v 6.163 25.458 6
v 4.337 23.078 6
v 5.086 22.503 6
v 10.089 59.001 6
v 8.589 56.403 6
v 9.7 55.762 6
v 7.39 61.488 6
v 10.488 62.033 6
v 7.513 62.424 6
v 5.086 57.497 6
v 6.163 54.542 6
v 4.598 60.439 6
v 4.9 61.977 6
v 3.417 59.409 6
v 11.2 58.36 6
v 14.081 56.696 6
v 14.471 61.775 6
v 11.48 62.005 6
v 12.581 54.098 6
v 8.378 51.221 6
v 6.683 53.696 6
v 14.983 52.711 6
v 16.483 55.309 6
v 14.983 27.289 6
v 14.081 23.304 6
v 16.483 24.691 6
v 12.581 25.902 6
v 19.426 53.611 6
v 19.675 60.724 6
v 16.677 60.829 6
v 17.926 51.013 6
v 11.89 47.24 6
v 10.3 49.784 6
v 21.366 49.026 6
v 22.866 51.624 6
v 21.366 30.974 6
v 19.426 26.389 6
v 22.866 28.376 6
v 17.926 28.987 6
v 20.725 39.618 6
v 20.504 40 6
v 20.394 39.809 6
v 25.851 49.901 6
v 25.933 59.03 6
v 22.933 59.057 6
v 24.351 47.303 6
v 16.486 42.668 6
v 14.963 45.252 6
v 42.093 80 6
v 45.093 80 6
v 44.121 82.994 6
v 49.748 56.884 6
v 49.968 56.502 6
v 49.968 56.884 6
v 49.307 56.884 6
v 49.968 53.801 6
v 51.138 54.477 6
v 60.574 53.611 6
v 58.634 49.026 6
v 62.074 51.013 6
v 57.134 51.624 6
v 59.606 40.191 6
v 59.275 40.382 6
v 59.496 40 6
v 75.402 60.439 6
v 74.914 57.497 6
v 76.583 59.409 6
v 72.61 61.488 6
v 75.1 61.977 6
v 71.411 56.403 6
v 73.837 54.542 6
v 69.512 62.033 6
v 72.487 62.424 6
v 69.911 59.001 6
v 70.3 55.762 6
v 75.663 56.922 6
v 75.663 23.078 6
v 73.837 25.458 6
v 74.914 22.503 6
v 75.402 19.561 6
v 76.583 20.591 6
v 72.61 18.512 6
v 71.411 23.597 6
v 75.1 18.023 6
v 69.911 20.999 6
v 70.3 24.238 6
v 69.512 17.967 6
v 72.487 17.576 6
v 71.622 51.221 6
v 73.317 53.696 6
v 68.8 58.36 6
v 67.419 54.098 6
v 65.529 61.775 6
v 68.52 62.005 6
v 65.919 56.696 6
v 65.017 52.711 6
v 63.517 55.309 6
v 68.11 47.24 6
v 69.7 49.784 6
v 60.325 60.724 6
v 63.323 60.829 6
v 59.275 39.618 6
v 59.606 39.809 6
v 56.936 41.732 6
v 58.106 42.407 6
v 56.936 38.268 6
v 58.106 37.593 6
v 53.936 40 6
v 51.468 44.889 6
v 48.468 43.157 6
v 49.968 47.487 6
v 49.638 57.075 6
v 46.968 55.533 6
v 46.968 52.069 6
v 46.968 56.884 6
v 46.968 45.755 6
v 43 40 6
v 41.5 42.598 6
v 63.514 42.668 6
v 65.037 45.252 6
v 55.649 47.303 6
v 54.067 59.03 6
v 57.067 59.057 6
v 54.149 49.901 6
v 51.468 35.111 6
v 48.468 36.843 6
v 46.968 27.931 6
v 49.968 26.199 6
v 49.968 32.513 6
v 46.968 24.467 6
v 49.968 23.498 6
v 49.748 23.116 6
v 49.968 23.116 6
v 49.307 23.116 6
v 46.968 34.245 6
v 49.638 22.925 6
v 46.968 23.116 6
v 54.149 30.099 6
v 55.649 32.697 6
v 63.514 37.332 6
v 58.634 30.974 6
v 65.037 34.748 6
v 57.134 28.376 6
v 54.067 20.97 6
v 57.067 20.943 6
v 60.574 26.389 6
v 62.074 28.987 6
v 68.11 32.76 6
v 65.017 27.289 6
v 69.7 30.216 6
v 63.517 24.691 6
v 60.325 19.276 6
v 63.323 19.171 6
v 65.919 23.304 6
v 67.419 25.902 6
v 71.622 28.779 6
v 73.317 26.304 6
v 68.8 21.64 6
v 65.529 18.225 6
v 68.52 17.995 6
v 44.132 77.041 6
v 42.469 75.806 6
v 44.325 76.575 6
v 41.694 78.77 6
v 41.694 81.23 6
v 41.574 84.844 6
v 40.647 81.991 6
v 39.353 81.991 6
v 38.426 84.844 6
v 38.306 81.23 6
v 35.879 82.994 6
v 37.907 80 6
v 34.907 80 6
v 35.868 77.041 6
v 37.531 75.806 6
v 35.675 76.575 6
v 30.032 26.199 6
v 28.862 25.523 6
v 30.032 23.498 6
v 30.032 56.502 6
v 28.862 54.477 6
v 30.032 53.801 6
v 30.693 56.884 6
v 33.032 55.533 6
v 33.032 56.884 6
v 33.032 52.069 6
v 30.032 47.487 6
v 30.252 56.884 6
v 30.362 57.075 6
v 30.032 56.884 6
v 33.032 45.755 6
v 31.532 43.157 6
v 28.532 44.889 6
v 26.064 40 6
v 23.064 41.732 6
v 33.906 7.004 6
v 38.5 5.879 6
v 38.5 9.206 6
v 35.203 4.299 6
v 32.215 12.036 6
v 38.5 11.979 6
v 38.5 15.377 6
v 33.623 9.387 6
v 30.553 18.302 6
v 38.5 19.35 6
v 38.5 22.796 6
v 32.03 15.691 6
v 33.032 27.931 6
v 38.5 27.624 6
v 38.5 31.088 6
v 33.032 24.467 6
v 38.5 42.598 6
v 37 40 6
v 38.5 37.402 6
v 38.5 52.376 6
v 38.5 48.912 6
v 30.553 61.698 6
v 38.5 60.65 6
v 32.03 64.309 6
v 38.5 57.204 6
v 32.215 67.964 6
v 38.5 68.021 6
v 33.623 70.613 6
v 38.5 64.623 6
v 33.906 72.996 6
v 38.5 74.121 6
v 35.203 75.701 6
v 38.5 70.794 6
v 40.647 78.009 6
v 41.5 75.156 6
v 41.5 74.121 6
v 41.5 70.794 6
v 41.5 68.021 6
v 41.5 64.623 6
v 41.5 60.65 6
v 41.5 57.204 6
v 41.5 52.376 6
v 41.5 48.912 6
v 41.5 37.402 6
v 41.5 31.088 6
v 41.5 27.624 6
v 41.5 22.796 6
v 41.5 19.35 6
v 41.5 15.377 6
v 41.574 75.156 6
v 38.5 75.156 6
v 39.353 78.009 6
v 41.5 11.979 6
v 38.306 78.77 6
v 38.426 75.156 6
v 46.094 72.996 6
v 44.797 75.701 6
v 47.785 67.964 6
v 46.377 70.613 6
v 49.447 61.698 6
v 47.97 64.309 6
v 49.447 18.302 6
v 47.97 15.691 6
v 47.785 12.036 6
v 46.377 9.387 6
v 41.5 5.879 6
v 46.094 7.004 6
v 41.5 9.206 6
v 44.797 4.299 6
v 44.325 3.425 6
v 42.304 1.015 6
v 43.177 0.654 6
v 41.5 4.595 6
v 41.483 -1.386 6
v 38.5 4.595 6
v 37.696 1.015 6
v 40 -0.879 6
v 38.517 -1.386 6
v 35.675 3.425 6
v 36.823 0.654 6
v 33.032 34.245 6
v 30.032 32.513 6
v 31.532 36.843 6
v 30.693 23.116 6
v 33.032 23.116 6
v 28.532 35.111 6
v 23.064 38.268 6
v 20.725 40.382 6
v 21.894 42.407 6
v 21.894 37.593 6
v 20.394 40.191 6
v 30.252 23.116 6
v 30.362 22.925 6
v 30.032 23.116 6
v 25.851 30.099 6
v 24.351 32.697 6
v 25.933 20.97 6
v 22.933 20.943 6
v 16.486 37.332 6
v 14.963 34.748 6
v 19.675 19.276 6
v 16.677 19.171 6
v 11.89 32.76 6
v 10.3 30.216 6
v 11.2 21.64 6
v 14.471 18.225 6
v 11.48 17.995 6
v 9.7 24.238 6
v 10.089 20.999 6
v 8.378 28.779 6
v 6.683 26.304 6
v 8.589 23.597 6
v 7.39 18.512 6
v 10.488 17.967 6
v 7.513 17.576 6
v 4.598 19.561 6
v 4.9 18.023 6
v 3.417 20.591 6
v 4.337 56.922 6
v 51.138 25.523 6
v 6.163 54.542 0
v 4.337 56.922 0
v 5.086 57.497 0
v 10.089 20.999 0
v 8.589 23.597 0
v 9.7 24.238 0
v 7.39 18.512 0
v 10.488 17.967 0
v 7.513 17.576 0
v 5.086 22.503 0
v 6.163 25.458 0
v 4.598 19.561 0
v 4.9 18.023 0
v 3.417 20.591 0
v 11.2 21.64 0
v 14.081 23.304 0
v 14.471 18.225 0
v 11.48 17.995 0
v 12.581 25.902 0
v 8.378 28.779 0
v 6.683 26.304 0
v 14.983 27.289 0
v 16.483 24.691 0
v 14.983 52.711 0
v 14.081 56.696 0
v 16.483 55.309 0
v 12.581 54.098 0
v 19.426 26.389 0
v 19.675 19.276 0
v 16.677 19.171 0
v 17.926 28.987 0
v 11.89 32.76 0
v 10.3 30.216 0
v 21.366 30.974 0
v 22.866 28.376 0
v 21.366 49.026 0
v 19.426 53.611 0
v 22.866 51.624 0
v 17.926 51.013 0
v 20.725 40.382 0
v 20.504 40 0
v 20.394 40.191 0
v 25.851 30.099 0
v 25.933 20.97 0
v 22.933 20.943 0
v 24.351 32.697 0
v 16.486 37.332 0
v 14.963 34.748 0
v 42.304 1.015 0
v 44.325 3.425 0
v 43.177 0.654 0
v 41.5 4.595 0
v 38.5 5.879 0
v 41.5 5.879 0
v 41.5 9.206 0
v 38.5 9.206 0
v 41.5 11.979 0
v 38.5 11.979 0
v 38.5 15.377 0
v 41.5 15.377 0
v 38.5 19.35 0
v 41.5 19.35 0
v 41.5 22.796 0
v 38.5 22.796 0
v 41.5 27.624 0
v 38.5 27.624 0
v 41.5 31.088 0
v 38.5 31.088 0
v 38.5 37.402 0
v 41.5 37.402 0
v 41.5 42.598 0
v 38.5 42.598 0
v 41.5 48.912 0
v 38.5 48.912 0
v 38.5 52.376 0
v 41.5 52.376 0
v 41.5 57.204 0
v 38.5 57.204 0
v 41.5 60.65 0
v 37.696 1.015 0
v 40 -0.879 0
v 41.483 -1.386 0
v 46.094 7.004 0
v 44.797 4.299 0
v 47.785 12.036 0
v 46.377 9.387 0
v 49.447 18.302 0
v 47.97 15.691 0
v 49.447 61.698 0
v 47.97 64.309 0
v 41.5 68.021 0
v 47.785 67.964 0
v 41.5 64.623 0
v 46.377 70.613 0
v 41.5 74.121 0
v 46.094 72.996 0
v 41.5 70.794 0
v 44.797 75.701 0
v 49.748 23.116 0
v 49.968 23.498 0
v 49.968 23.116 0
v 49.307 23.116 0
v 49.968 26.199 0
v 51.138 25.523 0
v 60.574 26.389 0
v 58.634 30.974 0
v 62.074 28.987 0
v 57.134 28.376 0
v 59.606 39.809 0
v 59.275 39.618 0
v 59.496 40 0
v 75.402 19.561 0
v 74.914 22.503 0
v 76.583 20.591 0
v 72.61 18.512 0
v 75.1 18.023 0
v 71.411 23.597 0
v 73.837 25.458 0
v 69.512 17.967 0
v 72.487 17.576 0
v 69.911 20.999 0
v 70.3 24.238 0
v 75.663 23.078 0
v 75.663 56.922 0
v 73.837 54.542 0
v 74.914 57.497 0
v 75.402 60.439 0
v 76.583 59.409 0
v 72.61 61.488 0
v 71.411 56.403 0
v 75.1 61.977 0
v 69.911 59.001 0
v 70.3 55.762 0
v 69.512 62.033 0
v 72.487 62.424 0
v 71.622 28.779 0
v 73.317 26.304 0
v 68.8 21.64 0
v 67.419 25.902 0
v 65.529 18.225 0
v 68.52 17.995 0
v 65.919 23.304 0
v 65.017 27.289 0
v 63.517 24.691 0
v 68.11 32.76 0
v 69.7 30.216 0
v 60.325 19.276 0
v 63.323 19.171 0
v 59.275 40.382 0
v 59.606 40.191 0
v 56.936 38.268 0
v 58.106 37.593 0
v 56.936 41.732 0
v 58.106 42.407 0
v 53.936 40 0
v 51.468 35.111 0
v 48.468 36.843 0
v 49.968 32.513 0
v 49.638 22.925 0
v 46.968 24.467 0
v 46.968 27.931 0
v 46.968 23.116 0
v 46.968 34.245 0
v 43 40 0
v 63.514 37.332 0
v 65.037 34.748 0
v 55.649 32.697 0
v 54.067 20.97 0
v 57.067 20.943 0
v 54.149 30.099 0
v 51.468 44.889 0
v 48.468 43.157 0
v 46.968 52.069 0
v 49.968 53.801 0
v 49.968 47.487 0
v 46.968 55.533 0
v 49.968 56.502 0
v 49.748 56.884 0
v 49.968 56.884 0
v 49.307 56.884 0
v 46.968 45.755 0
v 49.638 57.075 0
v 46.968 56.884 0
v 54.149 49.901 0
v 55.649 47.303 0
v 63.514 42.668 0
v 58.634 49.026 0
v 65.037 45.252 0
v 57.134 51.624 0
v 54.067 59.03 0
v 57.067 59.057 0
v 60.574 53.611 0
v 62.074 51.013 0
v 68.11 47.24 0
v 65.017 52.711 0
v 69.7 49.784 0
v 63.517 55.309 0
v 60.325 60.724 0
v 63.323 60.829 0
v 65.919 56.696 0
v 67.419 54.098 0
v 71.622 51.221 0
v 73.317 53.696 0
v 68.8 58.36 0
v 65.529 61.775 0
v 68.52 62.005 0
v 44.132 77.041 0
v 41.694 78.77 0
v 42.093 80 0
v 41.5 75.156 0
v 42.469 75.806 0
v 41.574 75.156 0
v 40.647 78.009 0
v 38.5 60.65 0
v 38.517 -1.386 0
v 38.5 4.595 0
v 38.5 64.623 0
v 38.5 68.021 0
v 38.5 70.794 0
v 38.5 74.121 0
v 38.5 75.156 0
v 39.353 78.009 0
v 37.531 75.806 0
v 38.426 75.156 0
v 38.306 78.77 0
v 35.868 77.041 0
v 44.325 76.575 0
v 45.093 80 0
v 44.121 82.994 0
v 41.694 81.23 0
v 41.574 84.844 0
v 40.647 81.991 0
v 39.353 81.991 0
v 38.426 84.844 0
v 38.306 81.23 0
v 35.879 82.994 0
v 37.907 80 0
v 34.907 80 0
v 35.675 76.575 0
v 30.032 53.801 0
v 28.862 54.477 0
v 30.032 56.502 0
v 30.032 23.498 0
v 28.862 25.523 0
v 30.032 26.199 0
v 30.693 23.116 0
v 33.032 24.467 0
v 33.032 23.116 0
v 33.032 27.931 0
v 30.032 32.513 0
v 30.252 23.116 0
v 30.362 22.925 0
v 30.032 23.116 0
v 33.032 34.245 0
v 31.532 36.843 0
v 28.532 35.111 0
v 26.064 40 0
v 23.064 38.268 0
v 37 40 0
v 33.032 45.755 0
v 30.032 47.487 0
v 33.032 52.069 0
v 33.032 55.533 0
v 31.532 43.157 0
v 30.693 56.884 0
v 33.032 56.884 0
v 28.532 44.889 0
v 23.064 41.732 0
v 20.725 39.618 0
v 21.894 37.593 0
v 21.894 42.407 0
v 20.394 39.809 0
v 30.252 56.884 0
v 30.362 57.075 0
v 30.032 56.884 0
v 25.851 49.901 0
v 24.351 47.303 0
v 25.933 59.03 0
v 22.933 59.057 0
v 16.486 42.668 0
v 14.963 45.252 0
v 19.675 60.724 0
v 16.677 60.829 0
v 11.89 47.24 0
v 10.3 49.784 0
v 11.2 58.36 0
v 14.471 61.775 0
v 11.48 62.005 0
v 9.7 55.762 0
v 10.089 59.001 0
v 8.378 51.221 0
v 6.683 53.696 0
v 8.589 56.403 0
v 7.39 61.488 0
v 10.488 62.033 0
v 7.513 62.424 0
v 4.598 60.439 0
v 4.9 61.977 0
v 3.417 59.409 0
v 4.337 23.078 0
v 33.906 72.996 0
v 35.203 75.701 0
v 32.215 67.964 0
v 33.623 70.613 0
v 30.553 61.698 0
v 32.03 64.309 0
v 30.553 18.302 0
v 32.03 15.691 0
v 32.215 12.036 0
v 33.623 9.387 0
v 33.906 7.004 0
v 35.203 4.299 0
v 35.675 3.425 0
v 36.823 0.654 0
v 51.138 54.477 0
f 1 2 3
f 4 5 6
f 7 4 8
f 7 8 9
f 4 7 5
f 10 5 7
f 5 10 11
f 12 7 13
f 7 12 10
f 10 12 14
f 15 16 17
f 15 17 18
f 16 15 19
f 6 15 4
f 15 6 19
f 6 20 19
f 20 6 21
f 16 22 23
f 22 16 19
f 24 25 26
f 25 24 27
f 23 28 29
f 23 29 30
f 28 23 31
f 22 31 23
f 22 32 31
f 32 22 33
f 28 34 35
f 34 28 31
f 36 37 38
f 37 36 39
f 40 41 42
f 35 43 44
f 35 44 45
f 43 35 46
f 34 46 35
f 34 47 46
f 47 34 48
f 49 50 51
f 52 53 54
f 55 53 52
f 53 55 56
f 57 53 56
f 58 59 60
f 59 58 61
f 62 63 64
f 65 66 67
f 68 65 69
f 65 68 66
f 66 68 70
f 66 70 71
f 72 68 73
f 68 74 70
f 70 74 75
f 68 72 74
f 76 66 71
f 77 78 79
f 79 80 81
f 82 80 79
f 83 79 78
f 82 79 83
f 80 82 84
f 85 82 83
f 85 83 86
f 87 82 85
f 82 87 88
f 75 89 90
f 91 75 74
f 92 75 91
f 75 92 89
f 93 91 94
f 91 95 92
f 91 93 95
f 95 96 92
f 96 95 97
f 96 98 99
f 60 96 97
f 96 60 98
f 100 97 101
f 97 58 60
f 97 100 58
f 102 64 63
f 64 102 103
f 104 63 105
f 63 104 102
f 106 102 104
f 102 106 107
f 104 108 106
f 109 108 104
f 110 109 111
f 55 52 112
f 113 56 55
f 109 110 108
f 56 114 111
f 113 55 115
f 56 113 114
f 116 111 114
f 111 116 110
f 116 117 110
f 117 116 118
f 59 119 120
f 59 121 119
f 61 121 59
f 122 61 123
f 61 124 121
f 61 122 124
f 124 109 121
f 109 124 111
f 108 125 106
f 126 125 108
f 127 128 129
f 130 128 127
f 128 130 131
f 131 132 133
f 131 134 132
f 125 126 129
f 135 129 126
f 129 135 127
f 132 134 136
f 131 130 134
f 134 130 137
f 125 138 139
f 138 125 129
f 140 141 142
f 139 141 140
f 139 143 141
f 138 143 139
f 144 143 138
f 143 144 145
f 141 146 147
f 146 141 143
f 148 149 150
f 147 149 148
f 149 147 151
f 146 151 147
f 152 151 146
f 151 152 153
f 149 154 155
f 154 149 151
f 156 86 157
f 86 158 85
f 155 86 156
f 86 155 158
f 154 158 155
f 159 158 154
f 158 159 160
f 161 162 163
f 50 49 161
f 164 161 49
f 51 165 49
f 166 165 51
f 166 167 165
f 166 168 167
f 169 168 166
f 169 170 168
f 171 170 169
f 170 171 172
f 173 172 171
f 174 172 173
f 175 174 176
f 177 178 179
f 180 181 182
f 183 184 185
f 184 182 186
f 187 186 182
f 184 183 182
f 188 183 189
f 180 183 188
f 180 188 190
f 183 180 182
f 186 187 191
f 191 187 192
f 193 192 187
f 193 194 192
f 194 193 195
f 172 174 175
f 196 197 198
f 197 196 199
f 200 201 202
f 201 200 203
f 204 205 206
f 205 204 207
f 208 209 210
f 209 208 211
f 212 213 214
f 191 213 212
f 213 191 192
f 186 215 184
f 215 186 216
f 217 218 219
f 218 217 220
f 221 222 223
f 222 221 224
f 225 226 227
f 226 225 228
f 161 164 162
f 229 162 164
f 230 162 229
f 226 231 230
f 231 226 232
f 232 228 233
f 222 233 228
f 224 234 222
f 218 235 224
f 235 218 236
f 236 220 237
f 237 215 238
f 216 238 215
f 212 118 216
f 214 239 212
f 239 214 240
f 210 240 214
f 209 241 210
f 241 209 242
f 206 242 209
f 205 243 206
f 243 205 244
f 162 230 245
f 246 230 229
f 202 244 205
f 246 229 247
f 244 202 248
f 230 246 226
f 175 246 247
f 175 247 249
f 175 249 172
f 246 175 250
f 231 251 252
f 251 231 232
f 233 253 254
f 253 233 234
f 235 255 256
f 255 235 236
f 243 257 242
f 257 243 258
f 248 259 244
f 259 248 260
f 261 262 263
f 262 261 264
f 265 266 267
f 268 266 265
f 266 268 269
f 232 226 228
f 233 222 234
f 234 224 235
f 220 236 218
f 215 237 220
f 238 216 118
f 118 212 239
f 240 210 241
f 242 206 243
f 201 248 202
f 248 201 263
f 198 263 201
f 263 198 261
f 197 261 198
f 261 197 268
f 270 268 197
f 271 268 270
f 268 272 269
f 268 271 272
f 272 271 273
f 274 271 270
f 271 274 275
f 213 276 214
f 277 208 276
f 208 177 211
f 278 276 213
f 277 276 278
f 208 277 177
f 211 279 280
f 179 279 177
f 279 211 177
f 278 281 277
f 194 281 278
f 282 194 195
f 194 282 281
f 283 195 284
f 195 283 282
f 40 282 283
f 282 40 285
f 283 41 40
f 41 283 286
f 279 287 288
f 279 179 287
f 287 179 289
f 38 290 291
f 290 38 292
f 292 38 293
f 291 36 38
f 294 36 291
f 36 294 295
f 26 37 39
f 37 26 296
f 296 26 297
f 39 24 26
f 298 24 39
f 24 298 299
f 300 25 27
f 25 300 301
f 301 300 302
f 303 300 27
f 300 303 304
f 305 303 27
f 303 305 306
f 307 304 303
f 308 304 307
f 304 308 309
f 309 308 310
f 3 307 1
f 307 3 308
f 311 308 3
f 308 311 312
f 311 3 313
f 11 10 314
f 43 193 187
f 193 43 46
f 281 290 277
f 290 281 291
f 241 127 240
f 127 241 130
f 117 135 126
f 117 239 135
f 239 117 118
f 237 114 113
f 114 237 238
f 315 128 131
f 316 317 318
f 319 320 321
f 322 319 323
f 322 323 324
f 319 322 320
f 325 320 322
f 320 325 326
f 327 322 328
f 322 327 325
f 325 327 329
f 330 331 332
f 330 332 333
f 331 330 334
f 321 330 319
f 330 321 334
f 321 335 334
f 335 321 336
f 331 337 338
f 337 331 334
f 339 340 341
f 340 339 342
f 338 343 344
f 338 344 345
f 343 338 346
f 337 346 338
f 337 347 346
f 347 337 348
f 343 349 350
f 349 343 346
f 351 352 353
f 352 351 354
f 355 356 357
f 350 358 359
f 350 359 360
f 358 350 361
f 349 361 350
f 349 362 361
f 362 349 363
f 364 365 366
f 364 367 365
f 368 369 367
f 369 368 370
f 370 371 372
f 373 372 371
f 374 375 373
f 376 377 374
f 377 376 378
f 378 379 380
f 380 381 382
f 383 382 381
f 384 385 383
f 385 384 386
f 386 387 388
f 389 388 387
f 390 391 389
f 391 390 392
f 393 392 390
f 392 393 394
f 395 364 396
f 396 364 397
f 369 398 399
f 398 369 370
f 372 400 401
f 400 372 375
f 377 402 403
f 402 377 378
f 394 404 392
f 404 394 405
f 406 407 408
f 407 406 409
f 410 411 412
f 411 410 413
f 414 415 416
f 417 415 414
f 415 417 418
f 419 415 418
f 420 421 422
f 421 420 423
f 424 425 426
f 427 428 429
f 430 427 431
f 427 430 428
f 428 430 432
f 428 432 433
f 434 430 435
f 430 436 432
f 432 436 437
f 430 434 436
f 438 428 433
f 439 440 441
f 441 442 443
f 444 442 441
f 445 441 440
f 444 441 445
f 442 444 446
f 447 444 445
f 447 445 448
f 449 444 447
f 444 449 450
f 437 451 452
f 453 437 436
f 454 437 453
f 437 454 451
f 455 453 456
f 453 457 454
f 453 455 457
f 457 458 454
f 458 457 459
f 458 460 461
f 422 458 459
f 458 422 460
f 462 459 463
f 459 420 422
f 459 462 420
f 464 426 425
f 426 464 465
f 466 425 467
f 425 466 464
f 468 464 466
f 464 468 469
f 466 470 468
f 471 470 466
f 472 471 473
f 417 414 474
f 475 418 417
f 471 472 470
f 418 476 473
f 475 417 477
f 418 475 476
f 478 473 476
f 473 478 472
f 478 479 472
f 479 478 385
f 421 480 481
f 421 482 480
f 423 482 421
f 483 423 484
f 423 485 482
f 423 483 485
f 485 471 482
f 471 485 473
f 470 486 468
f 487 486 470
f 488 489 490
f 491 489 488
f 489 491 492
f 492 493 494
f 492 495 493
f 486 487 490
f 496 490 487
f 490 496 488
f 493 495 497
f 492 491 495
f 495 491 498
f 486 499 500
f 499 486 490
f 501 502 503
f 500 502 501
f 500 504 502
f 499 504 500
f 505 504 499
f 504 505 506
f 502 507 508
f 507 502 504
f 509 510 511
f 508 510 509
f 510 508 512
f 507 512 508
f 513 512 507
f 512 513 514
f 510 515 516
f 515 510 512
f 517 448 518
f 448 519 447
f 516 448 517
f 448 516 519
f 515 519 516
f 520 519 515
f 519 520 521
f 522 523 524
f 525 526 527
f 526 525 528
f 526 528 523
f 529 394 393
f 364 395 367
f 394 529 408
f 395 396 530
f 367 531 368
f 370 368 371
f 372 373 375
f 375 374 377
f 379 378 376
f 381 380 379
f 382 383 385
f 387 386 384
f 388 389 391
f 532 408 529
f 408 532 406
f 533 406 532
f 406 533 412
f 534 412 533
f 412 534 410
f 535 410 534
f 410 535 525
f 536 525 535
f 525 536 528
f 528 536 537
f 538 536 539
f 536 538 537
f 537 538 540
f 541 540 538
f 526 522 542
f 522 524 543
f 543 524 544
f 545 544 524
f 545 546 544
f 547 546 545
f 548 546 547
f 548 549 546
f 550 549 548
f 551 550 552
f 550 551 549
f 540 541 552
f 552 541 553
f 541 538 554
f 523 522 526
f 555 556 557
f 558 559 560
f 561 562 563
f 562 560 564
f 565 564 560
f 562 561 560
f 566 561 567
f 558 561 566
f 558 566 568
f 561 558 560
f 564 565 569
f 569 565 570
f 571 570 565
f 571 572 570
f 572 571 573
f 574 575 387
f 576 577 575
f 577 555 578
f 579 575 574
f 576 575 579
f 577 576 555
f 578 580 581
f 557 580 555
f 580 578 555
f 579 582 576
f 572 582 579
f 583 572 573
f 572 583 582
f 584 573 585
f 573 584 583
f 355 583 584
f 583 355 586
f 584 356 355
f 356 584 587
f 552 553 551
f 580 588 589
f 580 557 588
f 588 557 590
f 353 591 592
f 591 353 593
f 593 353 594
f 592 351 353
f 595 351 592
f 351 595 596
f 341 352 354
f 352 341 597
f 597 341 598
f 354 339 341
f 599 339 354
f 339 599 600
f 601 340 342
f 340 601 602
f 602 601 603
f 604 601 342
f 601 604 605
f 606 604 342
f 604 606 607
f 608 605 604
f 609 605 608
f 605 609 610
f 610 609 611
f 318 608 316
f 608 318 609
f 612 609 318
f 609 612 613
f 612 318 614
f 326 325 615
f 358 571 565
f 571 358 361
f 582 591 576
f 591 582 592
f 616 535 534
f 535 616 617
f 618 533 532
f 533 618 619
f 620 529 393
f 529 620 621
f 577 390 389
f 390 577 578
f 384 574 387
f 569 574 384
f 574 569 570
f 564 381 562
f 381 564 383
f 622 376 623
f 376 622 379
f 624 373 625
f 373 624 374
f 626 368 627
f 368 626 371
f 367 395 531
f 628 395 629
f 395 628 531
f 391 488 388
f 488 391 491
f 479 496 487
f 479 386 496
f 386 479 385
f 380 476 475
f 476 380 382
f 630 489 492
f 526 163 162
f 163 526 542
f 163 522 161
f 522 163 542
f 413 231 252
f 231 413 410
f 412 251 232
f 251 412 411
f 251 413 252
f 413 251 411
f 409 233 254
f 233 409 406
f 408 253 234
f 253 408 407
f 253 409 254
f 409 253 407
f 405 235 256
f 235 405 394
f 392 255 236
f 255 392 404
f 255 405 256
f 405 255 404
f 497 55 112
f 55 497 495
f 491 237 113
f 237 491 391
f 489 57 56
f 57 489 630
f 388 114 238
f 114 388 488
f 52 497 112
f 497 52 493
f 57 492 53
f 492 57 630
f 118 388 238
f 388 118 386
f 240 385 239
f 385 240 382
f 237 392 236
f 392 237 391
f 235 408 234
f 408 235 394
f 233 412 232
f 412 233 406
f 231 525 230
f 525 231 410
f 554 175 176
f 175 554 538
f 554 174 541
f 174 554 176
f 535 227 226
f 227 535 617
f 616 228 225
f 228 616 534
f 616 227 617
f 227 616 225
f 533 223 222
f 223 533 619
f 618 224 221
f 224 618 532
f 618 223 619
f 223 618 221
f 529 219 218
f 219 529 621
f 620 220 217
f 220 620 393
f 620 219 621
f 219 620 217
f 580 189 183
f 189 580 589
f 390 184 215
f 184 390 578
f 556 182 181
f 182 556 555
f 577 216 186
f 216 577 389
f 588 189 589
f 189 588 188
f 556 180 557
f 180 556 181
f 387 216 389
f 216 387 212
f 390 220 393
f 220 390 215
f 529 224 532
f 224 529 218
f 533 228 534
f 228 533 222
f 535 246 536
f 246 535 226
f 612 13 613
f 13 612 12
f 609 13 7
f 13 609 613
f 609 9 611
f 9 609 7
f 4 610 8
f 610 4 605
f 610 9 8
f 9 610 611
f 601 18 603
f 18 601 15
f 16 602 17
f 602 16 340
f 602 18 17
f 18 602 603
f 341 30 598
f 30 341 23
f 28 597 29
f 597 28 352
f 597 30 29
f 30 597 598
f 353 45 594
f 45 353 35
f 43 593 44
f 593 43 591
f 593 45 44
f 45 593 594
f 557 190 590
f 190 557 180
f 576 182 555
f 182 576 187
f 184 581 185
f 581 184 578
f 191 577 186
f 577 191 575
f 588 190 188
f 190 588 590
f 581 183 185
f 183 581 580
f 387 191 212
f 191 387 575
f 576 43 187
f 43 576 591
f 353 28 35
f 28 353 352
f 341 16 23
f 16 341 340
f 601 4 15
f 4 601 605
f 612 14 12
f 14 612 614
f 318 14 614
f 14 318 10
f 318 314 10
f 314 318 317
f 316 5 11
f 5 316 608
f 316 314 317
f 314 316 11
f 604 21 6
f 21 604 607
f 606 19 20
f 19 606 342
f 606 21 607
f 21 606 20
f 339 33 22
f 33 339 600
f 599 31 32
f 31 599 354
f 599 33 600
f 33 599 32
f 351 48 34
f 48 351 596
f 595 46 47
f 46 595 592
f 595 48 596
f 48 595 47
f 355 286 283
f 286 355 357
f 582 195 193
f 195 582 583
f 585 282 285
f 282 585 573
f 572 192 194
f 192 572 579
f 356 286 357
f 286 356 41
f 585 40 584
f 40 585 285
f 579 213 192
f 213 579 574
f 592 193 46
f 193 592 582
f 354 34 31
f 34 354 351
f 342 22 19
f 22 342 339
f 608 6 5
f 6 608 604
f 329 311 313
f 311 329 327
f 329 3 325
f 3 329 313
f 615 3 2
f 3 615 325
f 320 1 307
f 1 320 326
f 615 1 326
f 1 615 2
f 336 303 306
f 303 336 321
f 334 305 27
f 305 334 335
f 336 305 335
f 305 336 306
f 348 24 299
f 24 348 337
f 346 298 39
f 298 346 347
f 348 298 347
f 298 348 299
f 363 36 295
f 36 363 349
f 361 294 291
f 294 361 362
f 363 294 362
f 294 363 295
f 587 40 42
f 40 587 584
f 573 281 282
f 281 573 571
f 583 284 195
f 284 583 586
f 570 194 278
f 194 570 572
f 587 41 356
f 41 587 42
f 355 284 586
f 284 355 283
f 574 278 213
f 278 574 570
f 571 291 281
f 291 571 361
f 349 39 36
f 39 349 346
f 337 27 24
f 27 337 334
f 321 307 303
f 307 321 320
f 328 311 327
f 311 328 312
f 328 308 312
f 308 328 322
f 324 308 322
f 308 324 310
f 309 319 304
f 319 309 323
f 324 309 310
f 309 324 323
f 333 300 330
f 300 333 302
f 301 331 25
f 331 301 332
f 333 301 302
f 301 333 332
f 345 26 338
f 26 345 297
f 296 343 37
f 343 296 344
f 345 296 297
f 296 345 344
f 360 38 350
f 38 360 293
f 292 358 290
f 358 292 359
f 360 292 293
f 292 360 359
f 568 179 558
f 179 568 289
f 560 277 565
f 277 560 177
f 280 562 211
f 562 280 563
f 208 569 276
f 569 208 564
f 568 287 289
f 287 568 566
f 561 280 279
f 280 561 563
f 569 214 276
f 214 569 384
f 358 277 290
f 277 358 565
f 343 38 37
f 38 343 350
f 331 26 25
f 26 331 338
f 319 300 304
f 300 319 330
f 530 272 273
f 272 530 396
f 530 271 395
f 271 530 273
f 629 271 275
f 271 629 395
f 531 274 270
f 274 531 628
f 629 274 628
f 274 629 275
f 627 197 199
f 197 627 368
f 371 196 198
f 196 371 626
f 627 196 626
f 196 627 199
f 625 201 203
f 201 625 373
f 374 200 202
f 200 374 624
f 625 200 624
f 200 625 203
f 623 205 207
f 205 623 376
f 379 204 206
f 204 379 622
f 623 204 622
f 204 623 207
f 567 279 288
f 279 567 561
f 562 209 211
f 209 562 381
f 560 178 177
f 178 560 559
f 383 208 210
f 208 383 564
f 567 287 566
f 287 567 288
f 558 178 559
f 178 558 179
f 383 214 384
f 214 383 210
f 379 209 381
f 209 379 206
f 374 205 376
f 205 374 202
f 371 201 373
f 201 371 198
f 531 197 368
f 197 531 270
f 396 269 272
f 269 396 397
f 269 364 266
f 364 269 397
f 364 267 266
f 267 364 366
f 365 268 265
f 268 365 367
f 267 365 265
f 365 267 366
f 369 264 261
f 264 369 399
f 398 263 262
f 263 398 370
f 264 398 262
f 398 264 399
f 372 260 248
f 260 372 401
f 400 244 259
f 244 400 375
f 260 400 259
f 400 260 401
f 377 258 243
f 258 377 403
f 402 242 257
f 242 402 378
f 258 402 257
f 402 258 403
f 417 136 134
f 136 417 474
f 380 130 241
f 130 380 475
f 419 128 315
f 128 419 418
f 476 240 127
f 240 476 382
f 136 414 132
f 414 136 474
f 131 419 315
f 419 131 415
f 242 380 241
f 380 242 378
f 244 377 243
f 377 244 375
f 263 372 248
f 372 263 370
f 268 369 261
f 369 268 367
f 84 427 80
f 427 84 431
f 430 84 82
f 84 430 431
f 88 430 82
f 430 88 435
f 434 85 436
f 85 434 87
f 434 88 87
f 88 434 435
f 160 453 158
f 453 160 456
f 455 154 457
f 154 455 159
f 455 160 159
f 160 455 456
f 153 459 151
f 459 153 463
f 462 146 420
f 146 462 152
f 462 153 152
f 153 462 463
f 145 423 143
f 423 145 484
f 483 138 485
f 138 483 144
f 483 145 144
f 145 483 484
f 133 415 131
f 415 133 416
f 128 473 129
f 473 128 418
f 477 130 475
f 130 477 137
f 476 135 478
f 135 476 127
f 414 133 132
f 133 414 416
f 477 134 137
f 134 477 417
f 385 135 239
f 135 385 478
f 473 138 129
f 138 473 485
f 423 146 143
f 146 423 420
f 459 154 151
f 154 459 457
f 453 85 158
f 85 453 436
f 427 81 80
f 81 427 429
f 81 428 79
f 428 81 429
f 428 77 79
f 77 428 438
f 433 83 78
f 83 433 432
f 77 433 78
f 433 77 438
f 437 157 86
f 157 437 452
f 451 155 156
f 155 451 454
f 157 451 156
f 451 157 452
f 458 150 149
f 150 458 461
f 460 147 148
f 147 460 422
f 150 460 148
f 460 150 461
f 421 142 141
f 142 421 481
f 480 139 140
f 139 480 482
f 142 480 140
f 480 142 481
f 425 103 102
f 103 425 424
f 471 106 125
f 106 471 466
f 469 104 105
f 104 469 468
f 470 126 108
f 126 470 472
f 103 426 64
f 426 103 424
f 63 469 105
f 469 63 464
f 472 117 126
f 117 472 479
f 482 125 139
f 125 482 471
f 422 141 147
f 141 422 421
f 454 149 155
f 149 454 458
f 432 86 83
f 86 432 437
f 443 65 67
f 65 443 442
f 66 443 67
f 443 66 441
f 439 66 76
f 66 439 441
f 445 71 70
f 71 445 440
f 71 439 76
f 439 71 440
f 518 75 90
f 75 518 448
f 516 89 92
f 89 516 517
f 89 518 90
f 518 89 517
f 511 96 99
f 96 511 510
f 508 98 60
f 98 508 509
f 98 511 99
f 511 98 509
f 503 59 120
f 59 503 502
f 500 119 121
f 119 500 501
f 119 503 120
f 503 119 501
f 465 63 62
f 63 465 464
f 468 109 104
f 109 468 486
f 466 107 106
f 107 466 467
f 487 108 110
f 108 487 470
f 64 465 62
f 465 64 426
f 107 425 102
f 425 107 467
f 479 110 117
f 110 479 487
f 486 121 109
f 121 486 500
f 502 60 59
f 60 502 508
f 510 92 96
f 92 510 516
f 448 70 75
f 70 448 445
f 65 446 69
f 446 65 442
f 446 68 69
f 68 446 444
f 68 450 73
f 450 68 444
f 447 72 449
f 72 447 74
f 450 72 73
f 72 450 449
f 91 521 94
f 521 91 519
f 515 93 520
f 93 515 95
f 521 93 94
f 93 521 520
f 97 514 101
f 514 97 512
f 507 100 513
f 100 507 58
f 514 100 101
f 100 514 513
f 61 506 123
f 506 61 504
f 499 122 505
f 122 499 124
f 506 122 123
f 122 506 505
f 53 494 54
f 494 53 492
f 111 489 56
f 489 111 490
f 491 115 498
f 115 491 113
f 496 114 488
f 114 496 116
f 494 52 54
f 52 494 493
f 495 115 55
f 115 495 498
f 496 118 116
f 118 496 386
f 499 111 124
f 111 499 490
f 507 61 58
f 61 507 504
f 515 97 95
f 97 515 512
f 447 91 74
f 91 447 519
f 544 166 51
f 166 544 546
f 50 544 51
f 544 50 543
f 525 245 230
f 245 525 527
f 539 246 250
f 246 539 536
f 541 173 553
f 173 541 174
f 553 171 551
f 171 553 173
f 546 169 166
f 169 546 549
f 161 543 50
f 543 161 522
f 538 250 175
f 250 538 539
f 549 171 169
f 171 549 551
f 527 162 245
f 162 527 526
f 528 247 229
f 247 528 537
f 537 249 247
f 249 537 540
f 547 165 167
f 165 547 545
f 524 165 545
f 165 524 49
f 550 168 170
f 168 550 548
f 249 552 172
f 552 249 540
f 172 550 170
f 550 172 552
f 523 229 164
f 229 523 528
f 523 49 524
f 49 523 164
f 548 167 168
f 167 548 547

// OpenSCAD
//Parametric Snowflake... and star
//common snowflake variables
//make seed 100 for a star
arm_num = 6;
branch_length =40;
branch_angle = 15;
branch_thickness = 3;
thickness = 6;
spike_num = 6; //suggest under 40
seed =1; //any number 1 -7

//snowflake starts
module tree(branch_length,branch_angle, branch_thickness, thickness,spike_num,seed){
	module half_tree(){
		cube([branch_thickness/2,branch_length,thickness]);

		for ( i = [1:spike_num]){
			translate([0, (branch_length-1.3)*cos(i*13), 0]) 
			rotate(branch_angle*(seed+sin(i*15))) 
			cube([branch_length*sin(i*(2+seed))+0.5, branch_thickness, thickness]);
		}
	}

	half_tree(branch_length, branch_angle,branch_thickness, thickness,spike_num, seed);
	mirror()half_tree(branch_length, branch_angle, thickness, spike_num, seed);
}

module snowflake(arm_num, branch_length, branch_angle, branch_thickness, thickness, spike_num, seed){
	hole_dist = branch_length;
	translate([0,branch_length,0])cylinder(h=thickness, r=branch_length*sin(1*(2+seed))+branch_thickness, $fn=10);
		for ( i = [0:arm_num-1]){
			rotate( i*360/arm_num, [0,0,1])
			tree(branch_length,branch_angle, branch_thickness, thickness,spike_num,seed);
		}
}

translate([branch_length,branch_length,0]){
difference(){

snowflake(
	arm_num, 
	branch_length, 
	branch_angle,
	branch_thickness,
	thickness,
	spike_num,
	seed
);
translate([0,branch_length,-2])cylinder(h=thickness*2, r=branch_length*sin(3), $fn=10);
}
}
